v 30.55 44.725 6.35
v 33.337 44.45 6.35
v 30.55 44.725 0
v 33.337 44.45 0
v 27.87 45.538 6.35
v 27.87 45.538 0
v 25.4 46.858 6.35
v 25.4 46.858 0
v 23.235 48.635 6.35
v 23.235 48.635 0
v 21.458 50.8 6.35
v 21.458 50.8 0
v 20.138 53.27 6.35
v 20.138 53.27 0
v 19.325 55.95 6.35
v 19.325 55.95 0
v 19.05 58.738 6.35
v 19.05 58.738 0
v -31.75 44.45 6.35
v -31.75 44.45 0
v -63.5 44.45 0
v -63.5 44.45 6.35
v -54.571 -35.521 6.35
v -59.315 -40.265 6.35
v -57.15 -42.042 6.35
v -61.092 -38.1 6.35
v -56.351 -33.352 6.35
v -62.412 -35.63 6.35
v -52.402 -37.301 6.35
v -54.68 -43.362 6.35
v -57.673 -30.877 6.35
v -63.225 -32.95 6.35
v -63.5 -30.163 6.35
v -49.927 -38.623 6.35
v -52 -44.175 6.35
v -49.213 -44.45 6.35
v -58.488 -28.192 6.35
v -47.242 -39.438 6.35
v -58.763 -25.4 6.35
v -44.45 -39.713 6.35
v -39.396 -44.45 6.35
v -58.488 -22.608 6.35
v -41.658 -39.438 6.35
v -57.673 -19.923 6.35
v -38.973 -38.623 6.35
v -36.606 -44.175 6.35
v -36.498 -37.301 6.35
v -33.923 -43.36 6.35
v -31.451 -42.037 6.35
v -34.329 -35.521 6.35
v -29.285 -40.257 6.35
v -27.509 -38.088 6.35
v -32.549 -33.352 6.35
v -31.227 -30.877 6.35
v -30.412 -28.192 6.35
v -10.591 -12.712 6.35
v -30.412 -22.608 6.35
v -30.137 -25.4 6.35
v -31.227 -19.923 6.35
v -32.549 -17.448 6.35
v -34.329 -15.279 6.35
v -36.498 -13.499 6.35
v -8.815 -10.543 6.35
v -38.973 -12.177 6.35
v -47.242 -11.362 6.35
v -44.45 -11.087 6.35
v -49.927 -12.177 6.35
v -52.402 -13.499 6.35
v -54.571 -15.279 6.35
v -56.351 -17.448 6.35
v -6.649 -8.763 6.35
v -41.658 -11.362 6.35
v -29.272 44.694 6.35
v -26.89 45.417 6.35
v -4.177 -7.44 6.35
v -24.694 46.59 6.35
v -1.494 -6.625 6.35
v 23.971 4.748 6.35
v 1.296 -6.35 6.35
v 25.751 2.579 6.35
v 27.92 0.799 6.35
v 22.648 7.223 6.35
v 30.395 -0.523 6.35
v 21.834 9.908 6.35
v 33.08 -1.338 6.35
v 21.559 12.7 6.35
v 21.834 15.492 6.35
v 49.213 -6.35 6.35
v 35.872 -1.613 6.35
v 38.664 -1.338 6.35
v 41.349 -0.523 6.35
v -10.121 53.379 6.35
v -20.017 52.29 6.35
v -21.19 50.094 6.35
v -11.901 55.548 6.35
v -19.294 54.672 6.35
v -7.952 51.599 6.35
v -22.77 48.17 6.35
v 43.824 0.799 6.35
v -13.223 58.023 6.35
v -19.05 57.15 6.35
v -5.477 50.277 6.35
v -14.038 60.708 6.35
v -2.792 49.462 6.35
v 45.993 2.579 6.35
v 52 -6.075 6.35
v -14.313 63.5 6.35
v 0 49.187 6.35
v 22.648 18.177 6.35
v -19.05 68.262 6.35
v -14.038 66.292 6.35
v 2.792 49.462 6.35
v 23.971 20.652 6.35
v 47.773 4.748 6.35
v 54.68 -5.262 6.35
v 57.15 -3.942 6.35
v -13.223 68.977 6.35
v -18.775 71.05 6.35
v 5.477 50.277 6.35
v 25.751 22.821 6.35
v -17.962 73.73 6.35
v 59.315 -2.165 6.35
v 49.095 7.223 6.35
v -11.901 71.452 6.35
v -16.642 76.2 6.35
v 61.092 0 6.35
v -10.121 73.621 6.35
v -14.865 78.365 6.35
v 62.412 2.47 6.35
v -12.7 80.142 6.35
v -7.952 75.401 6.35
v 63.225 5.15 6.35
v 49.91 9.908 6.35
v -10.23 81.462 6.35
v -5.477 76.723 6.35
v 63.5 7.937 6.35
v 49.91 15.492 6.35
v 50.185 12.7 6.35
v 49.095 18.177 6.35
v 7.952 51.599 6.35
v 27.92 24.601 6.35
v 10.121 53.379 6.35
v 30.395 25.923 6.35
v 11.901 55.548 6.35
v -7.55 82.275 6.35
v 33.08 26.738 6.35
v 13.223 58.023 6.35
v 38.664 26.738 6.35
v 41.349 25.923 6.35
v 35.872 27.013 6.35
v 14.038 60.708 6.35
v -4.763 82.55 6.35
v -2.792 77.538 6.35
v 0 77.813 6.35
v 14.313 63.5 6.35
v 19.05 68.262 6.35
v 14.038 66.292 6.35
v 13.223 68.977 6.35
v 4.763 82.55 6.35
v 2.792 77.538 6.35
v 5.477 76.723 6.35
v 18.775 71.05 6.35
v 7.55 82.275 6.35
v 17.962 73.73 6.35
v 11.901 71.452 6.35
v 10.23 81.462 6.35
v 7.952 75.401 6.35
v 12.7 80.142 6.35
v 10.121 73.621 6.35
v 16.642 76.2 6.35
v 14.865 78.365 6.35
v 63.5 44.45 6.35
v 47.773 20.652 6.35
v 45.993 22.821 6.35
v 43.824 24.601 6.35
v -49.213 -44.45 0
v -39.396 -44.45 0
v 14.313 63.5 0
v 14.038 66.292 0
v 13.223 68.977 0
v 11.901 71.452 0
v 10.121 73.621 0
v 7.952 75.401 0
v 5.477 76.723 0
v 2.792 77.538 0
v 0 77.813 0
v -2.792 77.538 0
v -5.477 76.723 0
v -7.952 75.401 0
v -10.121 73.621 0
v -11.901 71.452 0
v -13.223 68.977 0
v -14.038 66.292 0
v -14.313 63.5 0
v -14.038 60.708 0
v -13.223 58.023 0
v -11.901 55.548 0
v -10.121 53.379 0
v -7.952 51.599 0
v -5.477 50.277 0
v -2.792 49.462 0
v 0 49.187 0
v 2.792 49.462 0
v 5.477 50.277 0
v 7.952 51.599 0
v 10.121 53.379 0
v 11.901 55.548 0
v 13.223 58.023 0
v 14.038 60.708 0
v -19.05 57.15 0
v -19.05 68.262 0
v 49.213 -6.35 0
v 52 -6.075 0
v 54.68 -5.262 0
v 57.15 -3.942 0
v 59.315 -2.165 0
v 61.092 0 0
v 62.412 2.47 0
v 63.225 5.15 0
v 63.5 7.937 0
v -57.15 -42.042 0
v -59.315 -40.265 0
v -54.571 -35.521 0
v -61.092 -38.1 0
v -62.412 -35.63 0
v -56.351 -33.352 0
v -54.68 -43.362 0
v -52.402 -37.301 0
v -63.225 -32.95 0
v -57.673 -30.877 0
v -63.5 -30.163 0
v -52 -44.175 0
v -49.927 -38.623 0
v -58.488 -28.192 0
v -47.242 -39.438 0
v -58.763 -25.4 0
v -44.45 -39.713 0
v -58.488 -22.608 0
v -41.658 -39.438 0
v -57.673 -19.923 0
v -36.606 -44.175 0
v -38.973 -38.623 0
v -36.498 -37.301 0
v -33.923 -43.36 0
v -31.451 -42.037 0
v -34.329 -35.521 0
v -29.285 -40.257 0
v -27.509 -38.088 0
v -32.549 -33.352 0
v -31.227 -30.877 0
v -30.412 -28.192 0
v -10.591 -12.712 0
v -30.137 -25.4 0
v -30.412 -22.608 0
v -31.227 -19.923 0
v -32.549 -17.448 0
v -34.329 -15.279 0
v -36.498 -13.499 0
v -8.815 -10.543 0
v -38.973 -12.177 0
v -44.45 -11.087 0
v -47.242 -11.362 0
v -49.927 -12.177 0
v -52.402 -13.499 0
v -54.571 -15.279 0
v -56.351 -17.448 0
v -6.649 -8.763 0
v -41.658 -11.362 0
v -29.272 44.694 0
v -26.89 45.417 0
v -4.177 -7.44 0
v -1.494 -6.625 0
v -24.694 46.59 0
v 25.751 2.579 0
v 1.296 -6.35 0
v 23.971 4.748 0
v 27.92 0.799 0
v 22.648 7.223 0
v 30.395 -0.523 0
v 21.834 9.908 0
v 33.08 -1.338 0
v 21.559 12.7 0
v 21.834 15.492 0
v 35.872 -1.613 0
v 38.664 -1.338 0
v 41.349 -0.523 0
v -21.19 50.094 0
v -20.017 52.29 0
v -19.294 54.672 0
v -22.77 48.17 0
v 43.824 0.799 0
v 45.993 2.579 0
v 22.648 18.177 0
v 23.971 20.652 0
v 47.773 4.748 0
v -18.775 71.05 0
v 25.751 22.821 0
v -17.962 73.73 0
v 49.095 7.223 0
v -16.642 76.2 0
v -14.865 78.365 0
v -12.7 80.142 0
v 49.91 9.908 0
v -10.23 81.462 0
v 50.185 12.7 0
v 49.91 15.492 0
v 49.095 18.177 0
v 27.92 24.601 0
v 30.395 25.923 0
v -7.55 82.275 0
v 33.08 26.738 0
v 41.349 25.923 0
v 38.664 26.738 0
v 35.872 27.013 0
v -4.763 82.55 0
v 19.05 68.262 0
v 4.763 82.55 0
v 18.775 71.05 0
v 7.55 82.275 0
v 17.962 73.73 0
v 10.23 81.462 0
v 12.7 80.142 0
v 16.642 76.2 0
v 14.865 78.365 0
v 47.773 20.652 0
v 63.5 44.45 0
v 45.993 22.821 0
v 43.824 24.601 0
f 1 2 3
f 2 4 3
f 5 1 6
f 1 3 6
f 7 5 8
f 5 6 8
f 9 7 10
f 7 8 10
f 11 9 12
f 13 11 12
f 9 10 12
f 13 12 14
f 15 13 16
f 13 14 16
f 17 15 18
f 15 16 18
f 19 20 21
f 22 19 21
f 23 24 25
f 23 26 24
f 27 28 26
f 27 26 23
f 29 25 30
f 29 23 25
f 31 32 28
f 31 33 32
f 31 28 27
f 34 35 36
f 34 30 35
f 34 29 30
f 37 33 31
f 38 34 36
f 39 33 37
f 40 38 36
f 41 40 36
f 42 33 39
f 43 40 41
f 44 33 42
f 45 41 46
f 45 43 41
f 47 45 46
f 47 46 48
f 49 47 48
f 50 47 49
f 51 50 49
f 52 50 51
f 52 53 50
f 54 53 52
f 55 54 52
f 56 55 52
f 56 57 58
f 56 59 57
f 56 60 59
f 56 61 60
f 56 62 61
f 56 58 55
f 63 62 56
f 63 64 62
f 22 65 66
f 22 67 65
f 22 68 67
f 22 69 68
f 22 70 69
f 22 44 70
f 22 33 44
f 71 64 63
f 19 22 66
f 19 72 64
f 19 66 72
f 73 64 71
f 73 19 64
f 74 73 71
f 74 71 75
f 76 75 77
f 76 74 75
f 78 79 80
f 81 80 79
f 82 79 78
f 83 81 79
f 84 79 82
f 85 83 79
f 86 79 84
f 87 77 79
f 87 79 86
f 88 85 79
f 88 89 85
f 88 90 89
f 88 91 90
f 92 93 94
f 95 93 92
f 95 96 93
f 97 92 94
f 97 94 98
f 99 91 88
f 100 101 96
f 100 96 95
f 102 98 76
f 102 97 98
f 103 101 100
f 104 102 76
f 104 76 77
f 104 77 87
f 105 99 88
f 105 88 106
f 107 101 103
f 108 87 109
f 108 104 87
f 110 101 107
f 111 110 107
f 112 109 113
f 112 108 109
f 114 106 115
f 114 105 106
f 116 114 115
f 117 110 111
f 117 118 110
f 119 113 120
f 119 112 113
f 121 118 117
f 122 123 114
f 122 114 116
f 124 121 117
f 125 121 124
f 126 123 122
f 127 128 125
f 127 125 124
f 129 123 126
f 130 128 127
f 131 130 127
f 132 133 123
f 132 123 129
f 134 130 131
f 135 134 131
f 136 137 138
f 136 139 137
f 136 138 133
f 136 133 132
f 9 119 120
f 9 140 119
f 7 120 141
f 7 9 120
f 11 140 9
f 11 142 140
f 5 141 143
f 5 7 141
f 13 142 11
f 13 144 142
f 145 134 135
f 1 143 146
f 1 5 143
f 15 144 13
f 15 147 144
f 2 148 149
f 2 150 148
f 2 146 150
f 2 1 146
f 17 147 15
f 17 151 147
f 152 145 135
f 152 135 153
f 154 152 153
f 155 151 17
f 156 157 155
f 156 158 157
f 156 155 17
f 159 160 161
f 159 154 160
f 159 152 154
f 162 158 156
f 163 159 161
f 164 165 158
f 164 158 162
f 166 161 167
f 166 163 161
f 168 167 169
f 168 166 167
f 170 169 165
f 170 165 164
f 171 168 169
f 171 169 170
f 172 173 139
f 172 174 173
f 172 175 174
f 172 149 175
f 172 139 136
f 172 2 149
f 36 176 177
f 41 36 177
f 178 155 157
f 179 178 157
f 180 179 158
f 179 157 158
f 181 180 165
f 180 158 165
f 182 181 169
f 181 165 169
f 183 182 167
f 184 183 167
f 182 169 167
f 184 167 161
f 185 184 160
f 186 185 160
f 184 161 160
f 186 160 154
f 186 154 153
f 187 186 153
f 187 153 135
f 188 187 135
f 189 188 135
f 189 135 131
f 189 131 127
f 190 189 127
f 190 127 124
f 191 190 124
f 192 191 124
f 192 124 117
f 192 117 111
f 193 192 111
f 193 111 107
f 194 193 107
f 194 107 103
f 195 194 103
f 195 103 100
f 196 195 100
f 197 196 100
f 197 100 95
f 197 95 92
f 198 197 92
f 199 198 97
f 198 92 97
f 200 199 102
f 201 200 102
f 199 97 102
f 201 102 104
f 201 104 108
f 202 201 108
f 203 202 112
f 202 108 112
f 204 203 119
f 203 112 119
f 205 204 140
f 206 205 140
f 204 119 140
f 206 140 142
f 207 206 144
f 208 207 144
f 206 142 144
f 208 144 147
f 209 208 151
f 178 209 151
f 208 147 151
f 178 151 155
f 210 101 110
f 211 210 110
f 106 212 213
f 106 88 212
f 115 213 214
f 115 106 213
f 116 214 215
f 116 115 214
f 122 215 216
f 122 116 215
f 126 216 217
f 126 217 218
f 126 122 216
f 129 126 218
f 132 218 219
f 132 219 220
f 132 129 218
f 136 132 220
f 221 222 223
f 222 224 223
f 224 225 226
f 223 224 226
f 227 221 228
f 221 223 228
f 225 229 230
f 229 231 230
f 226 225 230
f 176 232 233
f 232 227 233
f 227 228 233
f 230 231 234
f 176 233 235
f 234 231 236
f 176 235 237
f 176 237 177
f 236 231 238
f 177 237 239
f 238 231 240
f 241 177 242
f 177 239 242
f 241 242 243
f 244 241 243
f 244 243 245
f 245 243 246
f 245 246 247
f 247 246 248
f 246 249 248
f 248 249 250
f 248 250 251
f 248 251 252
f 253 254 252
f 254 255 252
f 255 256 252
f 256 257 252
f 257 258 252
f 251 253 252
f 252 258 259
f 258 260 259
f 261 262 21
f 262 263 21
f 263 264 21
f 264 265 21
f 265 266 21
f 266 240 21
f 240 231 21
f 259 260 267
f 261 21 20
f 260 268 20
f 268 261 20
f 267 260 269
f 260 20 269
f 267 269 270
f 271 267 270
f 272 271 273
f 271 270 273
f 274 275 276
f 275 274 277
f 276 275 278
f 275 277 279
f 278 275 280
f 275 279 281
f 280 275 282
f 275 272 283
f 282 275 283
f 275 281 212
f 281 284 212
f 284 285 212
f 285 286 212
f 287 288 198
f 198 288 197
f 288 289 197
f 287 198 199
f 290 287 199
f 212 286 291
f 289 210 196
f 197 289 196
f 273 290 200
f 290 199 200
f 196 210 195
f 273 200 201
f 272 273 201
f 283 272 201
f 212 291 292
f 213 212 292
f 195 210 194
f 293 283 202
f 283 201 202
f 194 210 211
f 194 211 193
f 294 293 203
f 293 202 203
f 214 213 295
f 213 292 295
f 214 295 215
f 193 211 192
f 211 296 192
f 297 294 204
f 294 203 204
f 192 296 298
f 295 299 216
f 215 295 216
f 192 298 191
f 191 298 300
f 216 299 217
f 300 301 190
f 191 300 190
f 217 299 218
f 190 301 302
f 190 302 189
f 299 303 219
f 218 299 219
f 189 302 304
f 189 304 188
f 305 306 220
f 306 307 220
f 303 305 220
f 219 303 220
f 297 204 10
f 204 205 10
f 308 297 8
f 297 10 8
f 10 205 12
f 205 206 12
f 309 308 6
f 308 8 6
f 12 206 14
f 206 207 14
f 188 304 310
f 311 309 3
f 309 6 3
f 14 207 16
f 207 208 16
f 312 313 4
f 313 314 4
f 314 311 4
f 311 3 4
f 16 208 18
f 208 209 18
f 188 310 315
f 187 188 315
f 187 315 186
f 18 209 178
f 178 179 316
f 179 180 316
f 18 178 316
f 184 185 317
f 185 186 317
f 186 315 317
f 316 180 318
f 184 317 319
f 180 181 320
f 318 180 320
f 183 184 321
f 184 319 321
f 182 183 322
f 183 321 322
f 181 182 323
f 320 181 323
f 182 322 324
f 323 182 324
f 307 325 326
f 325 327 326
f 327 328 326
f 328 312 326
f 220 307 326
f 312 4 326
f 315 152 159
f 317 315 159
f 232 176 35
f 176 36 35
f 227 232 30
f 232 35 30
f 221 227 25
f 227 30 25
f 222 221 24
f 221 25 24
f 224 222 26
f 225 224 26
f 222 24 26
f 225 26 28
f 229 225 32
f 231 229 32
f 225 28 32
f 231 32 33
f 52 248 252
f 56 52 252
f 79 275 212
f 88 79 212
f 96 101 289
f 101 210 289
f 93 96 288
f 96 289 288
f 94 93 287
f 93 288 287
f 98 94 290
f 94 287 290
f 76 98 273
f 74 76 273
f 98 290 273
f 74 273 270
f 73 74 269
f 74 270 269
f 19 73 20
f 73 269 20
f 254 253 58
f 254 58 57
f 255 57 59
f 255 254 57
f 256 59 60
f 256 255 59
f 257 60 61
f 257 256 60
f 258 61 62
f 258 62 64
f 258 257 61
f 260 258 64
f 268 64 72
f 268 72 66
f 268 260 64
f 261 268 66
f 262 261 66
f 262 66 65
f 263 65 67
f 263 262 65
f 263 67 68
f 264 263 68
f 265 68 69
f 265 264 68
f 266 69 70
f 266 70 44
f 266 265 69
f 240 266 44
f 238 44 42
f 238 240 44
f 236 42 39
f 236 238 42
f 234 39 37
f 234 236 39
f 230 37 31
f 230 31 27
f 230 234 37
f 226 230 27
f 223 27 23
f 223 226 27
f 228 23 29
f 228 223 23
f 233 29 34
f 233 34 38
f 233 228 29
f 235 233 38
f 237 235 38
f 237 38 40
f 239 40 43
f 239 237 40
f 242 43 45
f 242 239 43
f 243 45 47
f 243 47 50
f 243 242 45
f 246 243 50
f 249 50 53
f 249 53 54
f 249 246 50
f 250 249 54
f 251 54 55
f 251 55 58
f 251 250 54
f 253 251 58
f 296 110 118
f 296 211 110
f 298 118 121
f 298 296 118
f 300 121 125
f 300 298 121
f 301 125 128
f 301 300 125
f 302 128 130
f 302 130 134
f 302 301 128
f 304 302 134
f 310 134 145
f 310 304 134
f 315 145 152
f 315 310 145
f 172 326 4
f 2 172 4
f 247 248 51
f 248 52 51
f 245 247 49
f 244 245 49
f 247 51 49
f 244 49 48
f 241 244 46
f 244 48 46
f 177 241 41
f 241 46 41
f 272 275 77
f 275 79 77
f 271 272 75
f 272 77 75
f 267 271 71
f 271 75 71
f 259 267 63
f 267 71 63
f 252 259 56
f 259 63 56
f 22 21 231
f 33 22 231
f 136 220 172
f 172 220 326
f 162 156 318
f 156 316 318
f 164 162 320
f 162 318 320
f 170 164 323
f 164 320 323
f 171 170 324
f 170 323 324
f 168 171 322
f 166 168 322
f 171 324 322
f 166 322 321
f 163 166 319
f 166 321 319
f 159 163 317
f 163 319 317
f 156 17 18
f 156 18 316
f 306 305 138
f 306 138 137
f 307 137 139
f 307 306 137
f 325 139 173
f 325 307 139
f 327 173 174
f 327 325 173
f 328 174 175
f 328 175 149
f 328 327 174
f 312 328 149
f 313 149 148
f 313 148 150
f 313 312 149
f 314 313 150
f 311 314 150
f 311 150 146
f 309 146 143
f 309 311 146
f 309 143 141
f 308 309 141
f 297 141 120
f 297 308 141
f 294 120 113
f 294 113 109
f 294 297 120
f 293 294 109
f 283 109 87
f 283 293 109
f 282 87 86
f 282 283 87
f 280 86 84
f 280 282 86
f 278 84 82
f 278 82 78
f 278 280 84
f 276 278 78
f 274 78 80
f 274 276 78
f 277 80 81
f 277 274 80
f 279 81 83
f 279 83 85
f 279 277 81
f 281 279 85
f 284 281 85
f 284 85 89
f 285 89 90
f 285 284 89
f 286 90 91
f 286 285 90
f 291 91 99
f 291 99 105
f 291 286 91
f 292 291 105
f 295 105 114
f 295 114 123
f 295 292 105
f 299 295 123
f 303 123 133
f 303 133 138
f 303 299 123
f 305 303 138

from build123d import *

# Parameters (mm, degrees)
SKETCH1_R           = 14.3129
BOSS_EXTRUDE1_DEPTH = 6.35
FILLET1_R           = 14.2875
SKETCH2_W           = 38.1
SKETCH2_H           = 38.1
BOSS_EXTRUDE2_DEPTH = 6.35
FILLET2_R           = 14.2875
SKETCH3_R           = 14.3129
CUT_EXTRUDE1_DEPTH  = 105.341147205
FILLET3_R           = 12.7


with BuildPart() as part:
    # Sketch1 → Boss-Extrude1 (new body)
    with BuildSketch(Plane.XY):
        Polygon((-6.35, -6.35), (63.5, -6.35), (63.5, 44.45), (-63.5, 44.45), (-63.5, -44.45), (-31.75, -44.45), align=None)
        with Locations((-44.45, -25.4)):
            Circle(SKETCH1_R, mode=Mode.SUBTRACT)
        with Locations((35.871852568, 12.7)):
            Circle(SKETCH1_R, mode=Mode.SUBTRACT)
    extrude(amount=BOSS_EXTRUDE1_DEPTH)

    # Fillet1
    fillet1_edges = [part.edges().sort_by_distance(p)[0] for p in [
        (-31.75, -44.45, 3.175),
        (-63.5, -44.45, 3.175),
        (63.5, -6.35, 3.175),
        (-6.35, -6.35, 3.175),
    ]]
    fillet(fillet1_edges, radius=FILLET1_R)

    # Sketch2 → Boss-Extrude2 (add)
    with BuildSketch(Plane.XY.offset(6.35)):
        with Locations((0, 63.5)):
            Rectangle(SKETCH2_W, SKETCH2_H)
    extrude(amount=-BOSS_EXTRUDE2_DEPTH)

    # Fillet2
    fillet2_edges = [part.edges().sort_by_distance(p)[0] for p in [
        (-19.05, 82.55, 3.175),
        (19.05, 82.55, 3.175),
        (19.05, 44.45, 3.175),
    ]]
    fillet(fillet2_edges, radius=FILLET2_R)

    # Sketch3 → Cut-Extrude1 (cut, through all)
    with BuildSketch(Plane.XY.offset(6.35)):
        with Locations((0, 63.5)):
            Circle(SKETCH3_R)
    extrude(amount=-CUT_EXTRUDE1_DEPTH, mode=Mode.SUBTRACT)

    # Fillet3
    fillet3_edges = [part.edges().sort_by_distance(p)[0] for p in [
        (-19.05, 44.45, 3.175),
    ]]
    fillet(fillet3_edges, radius=FILLET3_R)


solid = part.part
